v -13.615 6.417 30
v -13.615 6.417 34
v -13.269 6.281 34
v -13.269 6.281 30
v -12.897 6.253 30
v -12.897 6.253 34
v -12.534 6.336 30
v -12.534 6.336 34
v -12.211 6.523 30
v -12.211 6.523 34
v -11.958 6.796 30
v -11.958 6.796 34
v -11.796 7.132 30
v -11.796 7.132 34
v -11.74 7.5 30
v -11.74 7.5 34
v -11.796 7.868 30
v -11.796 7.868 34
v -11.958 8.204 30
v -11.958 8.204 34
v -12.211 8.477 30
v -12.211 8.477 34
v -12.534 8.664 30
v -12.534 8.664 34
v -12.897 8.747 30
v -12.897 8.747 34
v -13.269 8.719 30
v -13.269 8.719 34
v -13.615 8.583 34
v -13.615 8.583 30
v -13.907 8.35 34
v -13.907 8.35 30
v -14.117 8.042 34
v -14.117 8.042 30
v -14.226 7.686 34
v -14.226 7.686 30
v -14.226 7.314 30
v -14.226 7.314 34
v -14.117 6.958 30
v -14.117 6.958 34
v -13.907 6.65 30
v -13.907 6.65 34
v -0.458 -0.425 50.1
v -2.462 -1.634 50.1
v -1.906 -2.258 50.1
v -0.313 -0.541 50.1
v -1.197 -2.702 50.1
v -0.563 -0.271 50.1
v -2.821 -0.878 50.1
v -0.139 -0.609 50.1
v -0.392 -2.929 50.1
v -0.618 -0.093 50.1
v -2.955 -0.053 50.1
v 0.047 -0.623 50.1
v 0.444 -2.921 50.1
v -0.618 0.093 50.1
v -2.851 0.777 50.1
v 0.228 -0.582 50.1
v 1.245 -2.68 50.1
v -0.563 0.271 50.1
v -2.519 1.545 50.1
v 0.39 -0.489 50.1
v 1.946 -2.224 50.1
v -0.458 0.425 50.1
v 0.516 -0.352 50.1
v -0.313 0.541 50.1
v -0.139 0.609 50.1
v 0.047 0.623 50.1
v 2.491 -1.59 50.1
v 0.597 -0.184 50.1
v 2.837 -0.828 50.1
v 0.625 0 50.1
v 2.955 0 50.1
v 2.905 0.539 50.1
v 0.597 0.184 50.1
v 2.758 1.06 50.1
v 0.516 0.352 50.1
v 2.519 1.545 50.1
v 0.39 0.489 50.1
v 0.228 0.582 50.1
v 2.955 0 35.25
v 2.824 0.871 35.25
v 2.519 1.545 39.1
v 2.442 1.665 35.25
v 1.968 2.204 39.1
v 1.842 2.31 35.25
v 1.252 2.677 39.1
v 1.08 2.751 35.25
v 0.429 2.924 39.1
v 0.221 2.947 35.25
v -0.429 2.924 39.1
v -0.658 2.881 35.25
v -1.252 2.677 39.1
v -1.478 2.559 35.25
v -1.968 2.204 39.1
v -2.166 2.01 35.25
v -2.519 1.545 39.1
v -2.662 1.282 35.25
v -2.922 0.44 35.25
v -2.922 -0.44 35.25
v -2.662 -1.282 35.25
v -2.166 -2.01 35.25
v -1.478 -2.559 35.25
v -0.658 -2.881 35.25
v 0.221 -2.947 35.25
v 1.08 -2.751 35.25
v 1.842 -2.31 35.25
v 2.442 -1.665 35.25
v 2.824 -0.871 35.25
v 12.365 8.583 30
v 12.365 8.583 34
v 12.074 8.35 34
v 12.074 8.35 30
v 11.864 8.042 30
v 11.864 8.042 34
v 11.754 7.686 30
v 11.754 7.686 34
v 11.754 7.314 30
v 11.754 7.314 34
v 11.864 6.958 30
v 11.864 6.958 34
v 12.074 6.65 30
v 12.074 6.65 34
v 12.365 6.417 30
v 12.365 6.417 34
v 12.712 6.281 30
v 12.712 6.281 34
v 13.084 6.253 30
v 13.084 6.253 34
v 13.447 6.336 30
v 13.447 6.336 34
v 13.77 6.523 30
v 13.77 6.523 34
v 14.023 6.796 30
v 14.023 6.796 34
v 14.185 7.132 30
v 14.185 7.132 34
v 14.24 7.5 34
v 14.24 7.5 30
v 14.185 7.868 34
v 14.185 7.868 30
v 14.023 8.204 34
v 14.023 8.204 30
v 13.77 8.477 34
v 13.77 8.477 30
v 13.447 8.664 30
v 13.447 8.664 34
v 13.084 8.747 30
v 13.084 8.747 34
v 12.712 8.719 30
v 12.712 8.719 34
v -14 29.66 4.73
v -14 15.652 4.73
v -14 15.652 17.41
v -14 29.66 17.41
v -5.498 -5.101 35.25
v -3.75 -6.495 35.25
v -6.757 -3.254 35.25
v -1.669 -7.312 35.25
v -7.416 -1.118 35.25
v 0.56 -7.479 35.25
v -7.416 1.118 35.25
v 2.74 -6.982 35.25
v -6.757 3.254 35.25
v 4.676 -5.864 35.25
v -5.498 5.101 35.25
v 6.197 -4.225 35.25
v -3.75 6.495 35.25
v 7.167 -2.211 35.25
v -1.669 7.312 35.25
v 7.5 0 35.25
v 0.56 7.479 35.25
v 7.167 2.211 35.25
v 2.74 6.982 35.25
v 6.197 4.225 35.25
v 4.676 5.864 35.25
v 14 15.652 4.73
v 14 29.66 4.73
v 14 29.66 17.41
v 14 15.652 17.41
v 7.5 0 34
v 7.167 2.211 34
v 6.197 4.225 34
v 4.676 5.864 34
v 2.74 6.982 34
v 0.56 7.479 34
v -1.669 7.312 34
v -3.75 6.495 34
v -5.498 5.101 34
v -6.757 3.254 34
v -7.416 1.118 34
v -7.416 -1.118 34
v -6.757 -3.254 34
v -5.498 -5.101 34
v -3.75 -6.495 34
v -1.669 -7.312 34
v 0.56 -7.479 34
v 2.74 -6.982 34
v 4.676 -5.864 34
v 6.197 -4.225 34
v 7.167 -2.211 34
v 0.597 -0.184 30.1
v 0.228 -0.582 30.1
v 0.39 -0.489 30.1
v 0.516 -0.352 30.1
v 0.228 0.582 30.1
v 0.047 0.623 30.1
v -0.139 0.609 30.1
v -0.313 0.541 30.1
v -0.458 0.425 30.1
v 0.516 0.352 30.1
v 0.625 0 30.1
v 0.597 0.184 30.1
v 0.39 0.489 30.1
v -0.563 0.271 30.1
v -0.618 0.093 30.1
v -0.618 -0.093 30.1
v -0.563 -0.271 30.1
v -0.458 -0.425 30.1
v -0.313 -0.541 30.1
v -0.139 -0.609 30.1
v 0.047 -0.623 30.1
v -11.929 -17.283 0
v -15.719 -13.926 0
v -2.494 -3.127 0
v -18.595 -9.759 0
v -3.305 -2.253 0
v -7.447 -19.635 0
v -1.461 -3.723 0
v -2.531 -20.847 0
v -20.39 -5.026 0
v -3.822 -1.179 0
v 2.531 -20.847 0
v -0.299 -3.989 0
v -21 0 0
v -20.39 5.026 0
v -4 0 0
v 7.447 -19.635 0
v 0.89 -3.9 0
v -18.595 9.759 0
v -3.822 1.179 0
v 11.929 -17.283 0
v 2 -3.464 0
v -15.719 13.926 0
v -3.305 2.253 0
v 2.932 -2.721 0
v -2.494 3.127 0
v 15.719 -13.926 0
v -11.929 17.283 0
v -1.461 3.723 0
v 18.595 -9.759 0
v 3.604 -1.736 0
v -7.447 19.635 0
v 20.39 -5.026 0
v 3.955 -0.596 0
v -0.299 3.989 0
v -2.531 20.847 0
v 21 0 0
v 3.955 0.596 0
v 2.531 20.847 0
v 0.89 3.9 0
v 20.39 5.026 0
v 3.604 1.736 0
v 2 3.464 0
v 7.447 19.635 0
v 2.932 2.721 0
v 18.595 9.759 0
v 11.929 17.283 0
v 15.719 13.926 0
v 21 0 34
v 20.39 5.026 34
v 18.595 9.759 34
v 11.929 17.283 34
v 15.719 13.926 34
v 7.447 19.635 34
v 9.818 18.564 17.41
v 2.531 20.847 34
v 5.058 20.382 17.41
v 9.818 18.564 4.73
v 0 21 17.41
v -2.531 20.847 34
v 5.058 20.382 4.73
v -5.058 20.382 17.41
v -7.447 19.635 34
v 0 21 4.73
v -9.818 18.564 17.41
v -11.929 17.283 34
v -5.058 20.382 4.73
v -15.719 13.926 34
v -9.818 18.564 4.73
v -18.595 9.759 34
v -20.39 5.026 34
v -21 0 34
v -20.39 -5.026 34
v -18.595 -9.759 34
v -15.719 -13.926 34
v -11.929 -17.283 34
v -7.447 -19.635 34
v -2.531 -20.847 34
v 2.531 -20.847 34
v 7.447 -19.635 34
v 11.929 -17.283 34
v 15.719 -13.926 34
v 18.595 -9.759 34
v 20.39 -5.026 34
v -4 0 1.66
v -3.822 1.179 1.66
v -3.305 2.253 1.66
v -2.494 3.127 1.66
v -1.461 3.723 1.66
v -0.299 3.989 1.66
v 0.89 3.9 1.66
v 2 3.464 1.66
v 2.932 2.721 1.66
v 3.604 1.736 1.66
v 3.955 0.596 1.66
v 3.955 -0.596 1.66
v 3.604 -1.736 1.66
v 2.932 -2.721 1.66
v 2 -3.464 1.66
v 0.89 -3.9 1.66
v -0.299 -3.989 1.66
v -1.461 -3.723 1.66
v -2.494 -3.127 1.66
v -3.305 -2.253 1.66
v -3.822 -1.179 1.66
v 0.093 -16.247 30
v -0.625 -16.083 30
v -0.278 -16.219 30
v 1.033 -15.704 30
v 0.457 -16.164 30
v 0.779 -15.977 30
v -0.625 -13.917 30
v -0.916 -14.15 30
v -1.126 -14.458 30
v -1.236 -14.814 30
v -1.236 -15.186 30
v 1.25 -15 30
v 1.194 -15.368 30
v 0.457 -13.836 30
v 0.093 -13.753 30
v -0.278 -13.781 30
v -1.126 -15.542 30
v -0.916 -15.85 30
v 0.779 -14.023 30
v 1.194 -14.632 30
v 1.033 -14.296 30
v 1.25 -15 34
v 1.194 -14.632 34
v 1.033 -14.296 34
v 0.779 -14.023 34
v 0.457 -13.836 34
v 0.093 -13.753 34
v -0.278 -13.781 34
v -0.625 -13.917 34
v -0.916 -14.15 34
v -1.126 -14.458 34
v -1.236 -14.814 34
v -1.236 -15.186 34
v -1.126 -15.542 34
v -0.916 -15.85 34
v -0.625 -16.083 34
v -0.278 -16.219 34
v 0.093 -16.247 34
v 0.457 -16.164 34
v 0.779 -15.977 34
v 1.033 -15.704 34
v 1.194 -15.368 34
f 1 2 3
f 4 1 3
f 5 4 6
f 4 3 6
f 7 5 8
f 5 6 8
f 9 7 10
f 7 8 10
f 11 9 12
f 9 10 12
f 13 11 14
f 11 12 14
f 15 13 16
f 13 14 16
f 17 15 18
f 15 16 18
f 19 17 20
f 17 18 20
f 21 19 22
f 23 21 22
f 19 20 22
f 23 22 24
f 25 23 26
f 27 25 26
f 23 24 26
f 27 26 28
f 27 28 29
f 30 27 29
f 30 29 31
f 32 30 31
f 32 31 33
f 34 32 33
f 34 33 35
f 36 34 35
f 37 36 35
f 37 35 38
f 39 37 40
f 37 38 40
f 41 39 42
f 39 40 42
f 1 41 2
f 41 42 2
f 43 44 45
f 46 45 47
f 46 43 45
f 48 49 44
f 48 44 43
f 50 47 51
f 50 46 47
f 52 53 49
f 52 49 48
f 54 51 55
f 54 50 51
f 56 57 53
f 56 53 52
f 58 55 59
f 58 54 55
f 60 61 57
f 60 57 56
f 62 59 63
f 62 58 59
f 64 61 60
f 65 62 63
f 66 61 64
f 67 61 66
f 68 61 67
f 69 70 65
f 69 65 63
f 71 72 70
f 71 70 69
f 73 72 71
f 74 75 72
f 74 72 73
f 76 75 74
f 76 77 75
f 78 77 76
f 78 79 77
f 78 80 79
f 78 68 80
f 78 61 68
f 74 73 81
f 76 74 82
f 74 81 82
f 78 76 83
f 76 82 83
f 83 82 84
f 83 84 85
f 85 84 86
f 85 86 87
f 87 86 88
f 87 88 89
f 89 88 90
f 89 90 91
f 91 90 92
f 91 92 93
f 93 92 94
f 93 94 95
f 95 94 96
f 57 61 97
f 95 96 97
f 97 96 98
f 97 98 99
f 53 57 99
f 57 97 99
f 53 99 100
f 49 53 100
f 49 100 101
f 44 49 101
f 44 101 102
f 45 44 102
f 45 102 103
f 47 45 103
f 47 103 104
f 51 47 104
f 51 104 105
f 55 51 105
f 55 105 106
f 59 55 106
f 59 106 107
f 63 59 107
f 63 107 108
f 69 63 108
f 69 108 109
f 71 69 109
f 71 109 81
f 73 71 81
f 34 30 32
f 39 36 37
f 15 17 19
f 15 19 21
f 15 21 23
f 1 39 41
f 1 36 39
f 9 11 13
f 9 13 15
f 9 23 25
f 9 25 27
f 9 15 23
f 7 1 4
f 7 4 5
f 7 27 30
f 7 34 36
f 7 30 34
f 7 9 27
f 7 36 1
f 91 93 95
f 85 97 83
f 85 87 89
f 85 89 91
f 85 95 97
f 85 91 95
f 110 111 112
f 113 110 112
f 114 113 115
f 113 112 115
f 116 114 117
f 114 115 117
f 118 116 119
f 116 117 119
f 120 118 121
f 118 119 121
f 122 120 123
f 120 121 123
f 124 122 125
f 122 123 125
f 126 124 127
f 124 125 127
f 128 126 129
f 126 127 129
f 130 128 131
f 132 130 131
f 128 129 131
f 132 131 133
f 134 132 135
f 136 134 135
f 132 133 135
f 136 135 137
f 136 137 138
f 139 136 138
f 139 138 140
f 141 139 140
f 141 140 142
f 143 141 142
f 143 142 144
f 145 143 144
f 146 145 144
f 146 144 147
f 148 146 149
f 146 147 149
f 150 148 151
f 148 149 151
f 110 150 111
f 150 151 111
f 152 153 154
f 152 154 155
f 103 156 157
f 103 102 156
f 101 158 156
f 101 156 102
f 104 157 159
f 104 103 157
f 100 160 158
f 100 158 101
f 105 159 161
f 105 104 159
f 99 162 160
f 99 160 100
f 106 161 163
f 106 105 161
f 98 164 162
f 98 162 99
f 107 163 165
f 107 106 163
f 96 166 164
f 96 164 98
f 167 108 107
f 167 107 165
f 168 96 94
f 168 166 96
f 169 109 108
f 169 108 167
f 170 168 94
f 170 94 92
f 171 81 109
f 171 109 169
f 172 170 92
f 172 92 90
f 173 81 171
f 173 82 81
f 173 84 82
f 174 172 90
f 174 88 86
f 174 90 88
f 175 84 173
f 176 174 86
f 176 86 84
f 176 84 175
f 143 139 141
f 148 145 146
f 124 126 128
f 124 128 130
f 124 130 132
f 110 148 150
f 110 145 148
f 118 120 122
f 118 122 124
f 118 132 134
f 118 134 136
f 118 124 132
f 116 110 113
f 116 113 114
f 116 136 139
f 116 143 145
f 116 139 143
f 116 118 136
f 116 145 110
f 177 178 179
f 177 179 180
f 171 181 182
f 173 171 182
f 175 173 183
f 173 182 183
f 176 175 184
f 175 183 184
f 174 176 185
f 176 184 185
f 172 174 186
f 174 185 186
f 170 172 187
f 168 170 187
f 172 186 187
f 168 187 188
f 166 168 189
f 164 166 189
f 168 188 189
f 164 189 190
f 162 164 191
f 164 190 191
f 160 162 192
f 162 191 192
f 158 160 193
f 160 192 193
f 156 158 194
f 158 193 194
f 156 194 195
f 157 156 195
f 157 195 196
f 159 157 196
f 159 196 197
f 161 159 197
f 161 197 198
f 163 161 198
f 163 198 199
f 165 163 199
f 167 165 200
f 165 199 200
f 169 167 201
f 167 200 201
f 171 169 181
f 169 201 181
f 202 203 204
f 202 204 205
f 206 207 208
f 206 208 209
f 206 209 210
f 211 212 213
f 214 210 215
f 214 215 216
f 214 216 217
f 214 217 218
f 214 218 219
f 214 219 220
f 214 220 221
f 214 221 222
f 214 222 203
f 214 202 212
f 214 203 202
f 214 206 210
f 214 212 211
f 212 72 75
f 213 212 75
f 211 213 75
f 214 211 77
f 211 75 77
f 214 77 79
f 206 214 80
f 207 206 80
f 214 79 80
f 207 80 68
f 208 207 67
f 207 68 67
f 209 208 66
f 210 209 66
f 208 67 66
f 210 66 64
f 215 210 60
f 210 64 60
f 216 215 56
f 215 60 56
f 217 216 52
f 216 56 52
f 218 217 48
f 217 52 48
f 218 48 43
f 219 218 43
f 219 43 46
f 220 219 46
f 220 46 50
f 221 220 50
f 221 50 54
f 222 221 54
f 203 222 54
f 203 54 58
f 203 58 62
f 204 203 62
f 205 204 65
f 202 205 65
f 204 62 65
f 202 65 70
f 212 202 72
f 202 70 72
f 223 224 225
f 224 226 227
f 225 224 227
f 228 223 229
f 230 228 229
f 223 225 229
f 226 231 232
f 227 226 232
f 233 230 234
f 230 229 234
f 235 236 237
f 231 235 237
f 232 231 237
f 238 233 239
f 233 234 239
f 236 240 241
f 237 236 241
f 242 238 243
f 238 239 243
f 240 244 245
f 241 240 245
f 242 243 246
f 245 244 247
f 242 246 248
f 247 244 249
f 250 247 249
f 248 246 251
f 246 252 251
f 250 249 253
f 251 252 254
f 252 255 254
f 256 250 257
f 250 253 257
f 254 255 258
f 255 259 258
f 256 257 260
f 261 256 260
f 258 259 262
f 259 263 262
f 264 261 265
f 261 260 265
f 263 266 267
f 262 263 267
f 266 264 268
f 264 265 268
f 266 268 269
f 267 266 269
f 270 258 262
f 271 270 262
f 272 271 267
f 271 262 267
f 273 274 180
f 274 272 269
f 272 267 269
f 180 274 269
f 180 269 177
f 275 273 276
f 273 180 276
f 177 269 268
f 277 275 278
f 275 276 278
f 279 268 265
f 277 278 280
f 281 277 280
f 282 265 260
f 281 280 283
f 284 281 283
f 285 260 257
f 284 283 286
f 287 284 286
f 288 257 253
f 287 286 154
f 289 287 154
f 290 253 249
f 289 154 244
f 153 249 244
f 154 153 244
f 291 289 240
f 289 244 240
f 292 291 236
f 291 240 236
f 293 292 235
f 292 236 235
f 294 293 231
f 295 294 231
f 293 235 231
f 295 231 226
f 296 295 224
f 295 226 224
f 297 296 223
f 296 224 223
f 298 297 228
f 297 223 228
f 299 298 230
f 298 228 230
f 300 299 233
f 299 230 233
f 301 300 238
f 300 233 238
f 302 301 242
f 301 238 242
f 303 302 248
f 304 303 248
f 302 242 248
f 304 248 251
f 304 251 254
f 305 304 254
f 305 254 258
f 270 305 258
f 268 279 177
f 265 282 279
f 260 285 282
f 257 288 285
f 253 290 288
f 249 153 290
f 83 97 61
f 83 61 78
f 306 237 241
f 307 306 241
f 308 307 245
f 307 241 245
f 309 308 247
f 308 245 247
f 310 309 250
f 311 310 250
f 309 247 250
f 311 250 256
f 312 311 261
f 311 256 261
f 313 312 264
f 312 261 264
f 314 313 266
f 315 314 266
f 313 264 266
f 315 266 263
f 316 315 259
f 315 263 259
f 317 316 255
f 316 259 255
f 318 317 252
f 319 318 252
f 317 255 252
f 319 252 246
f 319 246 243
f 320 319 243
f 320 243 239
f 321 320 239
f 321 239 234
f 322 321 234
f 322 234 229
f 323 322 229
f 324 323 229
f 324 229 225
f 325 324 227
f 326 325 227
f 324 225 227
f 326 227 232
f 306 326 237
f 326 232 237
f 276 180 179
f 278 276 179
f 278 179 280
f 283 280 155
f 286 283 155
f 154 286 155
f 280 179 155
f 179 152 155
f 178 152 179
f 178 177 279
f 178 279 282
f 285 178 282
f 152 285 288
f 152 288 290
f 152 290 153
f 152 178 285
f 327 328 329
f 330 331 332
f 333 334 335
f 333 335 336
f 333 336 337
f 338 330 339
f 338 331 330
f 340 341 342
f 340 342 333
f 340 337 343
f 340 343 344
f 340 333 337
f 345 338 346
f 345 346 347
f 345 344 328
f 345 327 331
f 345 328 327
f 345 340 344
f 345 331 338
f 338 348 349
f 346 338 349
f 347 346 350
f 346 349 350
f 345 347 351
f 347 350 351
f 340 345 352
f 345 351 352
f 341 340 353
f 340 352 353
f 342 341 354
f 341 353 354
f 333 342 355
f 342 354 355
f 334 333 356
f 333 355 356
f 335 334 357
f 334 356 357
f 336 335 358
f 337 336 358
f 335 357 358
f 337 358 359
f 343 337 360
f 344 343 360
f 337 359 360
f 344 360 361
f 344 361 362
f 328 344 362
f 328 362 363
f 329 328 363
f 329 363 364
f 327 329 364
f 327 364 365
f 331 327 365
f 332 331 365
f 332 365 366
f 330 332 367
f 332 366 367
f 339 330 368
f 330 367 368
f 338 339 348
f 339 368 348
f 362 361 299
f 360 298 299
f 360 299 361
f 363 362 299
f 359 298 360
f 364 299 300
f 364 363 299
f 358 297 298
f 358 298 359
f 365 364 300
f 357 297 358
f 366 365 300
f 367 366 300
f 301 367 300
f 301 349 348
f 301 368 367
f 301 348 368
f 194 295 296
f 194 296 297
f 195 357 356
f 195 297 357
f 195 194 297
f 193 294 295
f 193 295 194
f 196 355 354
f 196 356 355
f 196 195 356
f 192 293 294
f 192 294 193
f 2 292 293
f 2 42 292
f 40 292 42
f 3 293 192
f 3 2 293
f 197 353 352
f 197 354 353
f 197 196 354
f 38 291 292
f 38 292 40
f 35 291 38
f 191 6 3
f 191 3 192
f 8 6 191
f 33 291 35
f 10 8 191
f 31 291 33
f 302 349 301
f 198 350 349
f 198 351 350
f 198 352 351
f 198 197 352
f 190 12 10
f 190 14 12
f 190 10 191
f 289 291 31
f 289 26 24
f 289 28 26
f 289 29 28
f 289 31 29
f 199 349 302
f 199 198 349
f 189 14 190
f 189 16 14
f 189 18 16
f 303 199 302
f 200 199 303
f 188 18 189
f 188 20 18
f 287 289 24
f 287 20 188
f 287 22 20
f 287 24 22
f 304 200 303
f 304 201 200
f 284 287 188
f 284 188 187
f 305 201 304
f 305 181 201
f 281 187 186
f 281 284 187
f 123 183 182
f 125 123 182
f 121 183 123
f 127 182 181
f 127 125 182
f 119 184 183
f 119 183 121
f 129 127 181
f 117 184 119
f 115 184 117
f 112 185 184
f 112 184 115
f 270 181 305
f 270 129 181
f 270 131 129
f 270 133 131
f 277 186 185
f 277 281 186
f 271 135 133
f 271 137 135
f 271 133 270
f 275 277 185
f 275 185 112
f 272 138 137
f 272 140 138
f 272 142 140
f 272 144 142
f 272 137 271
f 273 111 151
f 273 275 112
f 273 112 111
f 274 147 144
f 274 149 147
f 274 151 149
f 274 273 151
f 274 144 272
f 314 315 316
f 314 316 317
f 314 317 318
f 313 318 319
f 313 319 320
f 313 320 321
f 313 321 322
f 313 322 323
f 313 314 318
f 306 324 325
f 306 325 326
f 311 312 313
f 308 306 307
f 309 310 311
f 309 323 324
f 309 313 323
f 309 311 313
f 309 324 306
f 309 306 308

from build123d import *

# Parameters (mm, degrees)
SKETCH1_R           = 21
BOSS_EXTRUDE1_DEPTH = 34
SKETCH2_R           = 7.5
BOSS_EXTRUDE2_DEPTH = 1.25
SKETCH3_R           = 2.955
BOSS_EXTRUDE3_DEPTH = 14.85
CUT_EXTRUDE1_START  = -11
CUT_EXTRUDE1_DEPTH  = 11
SKETCH5_R           = 0.625
CUT_EXTRUDE2_DEPTH  = 20
SKETCH6_R           = 1.25
CUT_EXTRUDE3_DEPTH  = 4
CIRPATTERN1_COUNT   = 3
BOSS_EXTRUDE4_START = -29.27
BOSS_EXTRUDE4_DEPTH = 12.68
SKETCH10_R          = 4
CUT_EXTRUDE4_DEPTH  = 1.66


with BuildPart() as part:
    # Sketch1 → Boss-Extrude1 (new body)
    with BuildSketch(Plane.XY):
        Circle(SKETCH1_R)
    extrude(amount=BOSS_EXTRUDE1_DEPTH)

    # Sketch2 → Boss-Extrude2 (add)
    with BuildSketch(Plane.XY.offset(34)):
        Circle(SKETCH2_R)
    extrude(amount=BOSS_EXTRUDE2_DEPTH)

    # Sketch3 → Boss-Extrude3 (add)
    with BuildSketch(Plane.XY.offset(35.25)):
        Circle(SKETCH3_R)
    extrude(amount=BOSS_EXTRUDE3_DEPTH)

    # Sketch4 → Cut-Extrude1 (cut)
    with BuildSketch(Plane.XY.offset(50.1).offset(CUT_EXTRUDE1_START)):
        with BuildLine():
            Line((-2.518928344, 1.545), (2.518928344, 1.545))
            ThreePointArc((2.518928344, 1.545), (0, 2.955), (-2.518928344, 1.545))
        make_face()
    extrude(amount=CUT_EXTRUDE1_DEPTH, mode=Mode.SUBTRACT)

    # Sketch5 → Cut-Extrude2 (cut)
    with BuildSketch(Plane.XY.offset(50.1)):
        Circle(SKETCH5_R)
    extrude(amount=-CUT_EXTRUDE2_DEPTH, mode=Mode.SUBTRACT)

    # Sketch6 → Cut-Extrude3 (cut)
    with BuildSketch(Plane.XY.offset(34)):
        with Locations((0, -15)):
            Circle(SKETCH6_R)
    cut_extrude3 = extrude(amount=-CUT_EXTRUDE3_DEPTH, mode=Mode.SUBTRACT)

    # CirPattern1: Cut-Extrude3 ×3 about axis
    cirpattern1_axis = Axis((0, 0, 0), (0, 0, 1))
    for i in range(1, CIRPATTERN1_COUNT):
        add(cut_extrude3.rotate(cirpattern1_axis, i * 360 / CIRPATTERN1_COUNT), mode=Mode.SUBTRACT)

    # Sketch9 → Boss-Extrude4 (add)
    with BuildSketch(Plane.XY.offset(34).offset(BOSS_EXTRUDE4_START)):
        with BuildLine():
            Line((-14, 15.652475842), (-14, 29.66))
            Line((-14, 29.66), (14, 29.66))
            Line((14, 29.66), (14, 15.652475842))
            ThreePointArc((14, 15.652475842), (0, 21), (-14, 15.652475842))
        make_face()
    extrude(amount=BOSS_EXTRUDE4_DEPTH)

    # Sketch10 → Cut-Extrude4 (cut)
    with BuildSketch(Plane(origin=(0, 0, 0), x_dir=(-1, 0, 0), z_dir=(0, 0, -1))):
        Circle(SKETCH10_R)
    extrude(amount=-CUT_EXTRUDE4_DEPTH, mode=Mode.SUBTRACT)


solid = part.part
